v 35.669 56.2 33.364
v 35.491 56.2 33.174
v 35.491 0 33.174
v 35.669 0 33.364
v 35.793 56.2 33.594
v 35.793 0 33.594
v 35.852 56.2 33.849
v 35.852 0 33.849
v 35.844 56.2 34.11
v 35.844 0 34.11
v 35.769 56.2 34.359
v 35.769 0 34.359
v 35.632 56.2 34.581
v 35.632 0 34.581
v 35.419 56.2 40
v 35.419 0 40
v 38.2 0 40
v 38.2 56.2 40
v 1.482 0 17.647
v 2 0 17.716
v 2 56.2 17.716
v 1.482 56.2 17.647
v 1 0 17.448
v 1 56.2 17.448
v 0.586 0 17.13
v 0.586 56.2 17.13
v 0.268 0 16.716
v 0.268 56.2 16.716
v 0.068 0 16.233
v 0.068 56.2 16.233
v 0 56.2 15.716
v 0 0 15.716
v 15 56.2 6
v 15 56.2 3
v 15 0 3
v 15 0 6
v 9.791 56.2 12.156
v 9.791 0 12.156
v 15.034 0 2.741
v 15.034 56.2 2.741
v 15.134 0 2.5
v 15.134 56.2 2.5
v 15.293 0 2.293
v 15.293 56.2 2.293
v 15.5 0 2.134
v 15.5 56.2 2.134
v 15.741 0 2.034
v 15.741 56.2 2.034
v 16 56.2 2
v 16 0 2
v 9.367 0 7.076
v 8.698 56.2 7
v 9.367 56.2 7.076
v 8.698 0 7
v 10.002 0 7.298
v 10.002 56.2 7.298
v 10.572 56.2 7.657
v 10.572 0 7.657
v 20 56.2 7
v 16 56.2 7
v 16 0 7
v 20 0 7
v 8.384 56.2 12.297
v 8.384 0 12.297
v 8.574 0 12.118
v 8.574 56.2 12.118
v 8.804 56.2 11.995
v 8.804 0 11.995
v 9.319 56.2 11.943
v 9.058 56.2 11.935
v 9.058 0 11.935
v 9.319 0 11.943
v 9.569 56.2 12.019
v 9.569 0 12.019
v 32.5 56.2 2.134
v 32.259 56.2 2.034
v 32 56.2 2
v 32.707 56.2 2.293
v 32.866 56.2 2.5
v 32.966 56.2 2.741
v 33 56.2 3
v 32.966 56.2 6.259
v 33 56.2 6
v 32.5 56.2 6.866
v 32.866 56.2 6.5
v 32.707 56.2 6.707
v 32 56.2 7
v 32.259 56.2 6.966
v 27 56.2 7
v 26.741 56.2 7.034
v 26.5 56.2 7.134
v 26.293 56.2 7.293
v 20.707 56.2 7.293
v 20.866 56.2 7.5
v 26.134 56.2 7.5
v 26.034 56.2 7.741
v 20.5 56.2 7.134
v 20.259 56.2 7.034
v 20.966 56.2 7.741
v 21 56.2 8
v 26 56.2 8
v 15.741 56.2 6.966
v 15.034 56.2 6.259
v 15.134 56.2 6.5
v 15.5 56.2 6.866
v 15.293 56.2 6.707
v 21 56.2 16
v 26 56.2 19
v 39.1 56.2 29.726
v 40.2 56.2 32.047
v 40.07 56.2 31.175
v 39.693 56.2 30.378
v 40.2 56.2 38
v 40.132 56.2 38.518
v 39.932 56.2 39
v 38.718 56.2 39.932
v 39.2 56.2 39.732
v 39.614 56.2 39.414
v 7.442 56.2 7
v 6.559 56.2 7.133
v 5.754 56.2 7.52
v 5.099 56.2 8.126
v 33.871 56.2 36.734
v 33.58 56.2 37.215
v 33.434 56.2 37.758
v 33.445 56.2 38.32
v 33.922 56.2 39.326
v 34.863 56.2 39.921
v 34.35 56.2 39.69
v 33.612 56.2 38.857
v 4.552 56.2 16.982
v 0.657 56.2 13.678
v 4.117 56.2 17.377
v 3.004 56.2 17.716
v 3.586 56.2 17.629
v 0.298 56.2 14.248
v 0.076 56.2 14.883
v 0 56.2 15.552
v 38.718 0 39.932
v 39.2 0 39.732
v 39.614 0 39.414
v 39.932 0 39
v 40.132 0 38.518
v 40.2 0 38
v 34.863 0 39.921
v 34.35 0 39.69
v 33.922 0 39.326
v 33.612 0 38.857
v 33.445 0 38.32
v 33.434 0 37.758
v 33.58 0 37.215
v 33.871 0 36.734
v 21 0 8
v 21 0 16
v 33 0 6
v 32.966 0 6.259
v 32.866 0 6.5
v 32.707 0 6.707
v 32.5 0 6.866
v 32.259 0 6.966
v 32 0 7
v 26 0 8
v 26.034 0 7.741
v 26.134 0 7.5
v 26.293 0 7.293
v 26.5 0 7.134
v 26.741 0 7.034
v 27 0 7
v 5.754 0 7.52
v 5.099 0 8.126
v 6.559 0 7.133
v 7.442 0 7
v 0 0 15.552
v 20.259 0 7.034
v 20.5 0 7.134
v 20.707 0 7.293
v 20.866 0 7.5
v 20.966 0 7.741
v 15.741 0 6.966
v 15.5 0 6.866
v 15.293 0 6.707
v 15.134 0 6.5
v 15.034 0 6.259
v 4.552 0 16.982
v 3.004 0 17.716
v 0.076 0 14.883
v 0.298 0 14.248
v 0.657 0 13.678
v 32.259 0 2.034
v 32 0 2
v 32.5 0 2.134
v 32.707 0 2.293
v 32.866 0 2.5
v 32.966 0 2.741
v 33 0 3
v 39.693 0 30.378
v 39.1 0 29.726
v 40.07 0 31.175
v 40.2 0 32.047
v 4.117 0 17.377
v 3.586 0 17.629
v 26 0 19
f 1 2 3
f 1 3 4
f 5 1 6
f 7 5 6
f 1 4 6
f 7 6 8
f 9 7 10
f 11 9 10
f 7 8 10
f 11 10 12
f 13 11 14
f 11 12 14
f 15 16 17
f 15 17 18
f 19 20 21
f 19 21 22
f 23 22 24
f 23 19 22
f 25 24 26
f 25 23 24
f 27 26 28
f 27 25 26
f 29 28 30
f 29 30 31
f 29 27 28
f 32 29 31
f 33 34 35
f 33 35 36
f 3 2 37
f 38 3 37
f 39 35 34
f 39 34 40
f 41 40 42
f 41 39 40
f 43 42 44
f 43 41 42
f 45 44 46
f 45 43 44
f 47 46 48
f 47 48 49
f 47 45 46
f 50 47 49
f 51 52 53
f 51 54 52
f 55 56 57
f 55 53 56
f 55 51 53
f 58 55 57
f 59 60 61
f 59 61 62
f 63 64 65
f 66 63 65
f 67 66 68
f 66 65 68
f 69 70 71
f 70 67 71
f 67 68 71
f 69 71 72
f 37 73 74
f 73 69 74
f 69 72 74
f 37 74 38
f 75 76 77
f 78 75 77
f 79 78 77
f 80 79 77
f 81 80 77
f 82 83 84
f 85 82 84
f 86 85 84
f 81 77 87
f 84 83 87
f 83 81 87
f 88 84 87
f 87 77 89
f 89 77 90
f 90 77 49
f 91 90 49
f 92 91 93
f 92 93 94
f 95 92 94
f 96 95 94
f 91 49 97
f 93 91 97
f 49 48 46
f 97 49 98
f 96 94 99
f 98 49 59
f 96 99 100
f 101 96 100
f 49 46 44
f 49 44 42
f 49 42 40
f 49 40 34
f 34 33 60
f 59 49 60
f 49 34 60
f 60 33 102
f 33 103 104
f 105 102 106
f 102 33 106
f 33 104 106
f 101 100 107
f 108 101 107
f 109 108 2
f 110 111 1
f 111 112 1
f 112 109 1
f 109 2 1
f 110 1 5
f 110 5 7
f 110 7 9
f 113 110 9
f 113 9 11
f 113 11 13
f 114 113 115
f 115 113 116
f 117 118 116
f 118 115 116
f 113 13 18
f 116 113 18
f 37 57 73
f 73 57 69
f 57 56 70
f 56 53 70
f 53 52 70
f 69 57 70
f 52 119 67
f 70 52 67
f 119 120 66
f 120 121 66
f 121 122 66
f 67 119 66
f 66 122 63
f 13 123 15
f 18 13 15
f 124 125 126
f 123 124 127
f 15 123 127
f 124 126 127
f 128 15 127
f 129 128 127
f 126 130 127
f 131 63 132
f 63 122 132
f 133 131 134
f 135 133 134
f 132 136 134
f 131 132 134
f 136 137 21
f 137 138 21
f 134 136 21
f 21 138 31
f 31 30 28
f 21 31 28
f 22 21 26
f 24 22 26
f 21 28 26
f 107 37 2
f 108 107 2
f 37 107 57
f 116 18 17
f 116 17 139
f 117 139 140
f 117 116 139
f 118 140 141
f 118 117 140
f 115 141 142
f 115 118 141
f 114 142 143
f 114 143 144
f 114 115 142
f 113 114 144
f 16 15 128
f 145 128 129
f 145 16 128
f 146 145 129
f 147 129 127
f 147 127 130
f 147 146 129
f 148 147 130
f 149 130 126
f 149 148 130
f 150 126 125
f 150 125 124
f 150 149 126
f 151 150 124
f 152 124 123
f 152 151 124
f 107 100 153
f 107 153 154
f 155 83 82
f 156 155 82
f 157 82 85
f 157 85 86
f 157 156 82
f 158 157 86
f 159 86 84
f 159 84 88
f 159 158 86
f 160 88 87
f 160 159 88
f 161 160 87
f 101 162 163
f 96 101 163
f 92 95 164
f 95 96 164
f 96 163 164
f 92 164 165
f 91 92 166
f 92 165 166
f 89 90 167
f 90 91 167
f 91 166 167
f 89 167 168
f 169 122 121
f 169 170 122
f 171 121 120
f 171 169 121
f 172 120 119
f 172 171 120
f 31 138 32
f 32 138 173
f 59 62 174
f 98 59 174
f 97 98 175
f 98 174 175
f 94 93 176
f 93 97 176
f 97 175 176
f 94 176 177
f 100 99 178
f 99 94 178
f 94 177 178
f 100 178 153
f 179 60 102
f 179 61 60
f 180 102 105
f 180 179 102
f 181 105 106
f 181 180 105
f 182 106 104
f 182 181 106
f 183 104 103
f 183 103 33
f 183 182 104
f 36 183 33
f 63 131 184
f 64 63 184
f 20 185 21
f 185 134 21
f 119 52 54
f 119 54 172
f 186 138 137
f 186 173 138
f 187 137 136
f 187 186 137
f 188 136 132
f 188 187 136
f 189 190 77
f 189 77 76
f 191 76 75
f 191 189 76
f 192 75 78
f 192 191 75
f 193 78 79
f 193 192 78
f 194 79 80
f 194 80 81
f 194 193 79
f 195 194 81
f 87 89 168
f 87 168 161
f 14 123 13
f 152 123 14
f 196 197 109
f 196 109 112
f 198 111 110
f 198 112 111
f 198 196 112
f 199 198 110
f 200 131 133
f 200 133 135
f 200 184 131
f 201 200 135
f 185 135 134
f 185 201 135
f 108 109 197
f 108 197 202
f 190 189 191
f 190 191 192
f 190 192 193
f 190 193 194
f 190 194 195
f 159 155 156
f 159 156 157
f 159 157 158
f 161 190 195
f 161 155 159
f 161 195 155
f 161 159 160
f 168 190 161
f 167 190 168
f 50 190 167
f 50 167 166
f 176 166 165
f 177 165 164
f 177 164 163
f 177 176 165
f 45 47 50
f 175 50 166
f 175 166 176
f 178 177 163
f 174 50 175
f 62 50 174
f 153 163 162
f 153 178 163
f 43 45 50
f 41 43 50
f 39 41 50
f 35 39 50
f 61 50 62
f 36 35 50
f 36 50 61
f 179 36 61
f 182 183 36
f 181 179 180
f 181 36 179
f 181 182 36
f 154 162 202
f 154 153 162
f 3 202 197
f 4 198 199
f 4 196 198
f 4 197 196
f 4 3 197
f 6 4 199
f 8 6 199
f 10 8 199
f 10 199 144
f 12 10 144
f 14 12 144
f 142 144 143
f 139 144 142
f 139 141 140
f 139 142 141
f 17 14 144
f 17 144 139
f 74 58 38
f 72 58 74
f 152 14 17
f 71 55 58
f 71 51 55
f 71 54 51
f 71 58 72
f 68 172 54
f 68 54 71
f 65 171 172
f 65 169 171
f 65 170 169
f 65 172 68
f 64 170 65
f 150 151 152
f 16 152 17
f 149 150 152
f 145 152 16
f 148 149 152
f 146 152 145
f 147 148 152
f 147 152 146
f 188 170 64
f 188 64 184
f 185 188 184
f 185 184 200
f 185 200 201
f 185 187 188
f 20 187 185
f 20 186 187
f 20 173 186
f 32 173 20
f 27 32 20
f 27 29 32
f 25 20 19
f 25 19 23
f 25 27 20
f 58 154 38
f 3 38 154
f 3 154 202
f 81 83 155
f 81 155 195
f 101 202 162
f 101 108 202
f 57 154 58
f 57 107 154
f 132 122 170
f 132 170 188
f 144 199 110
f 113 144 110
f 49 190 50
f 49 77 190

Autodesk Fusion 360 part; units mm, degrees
sketch "Schizzo1" plane through (0, 0, 0) normal (0, 0, 1) x (1, 0, 0)
  line L0 (0, 0) -> (35.2, 0)
  line L1 (35.2, 0) -> (35.2, 56.2)
  line L2 (35.2, 56.2) -> (0, 56.2)
  line L3 (0, 56.2) -> (0, 0)
  dimension "d1" = 35.2
  dimension "d2" = 56.2
extrude "Estrusione1" add sketch "Schizzo1" along normal blind 40
sketch "Schizzo2" plane through (0, 56.2, 0) normal (0, 1, 0) x (-1, 0, 0)
  line L0 (-35.2, 0) -> (0, 0)
  line L1 (0, 0) -> (0, 40)
  line L2 (0, 40) -> (-35.2, 40)
  line L3 (-35.2, 40) -> (-35.2, 0)
  line L4 (-35.2, 40) -> (-31.2, 40)
  line L5 (-31.2, 40) -> (-3.9522, 17.7156)
  line L6 (-3.9522, 17.7156) -> (0, 17.7156)
  dimension "d5" = 4
  dimension "d6" = 35.2
extrude "Estrusione2" cut sketch "Schizzo2" against normal blind 70 contours L1 L2 L5 L6
extrude "Estrusione3" cut 1 faces at (22.1174, 37.4667, 32.5719) along direction (0.63308, 0, -0.774086) blind 5
extrude "Estrusione4" add 1 faces at (35.2, 18.7333, 13.3333) along direction (1, 0, 0) blind 5
fillet "Raccordo1" radius 2 4 edges at (3.9522, 28.1, 17.7156) (0, 28.1, 17.7156) (31.2, 28.1, 40) (40.2, 28.1, 40)
extrude "Estrusione5" cut 1 faces at (25.2828, 37.4667, 28.7014) along direction (0.63308, 0, -0.774086) blind 3
fillet "Raccordo2" radius 1 1 edges at (36.2646, 28.1, 33.8073)
fillet "Raccordo3" radius 1 1 edges at (9.0168, 28.1, 11.5229)
sketch "Schizzo7" plane through (0, 56.2, 0) normal (0, 1, 0) x (-1, 0, 0)
  line L0 (-4.5523, 16.9817) -> (-8.3837, 12.297)
  arc A0 (-9.7909, 12.156) -> (-8.3837, 12.297) centre (-9.1578, 12.9301) ccw
  line L1 (-9.7909, 12.156) -> (-35.4906, 33.1742)
  arc A1 (-35.6316, 34.5814) -> (-35.4906, 33.1742) centre (-34.8575, 33.9483) ccw
  line L2 (-35.6316, 34.5814) -> (-33.8712, 36.7338)
  arc A2 (-33.8712, 36.7338) -> (-35.4194, 40) centre (-35.4194, 38) ccw
  line L3 (-35.4194, 40) -> (-38.2, 40)
  arc A3 (-38.2, 40) -> (-40.2, 38) centre (-38.2, 38) ccw
  line L4 (-40.2, 38) -> (-40.2, 0)
  line L5 (-40.2, 0) -> (0, 0)
  line L6 (0, 0) -> (0, 15.7156)
  arc A4 (0, 15.7156) -> (-2, 17.7156) centre (-2, 15.7156) ccw
  line L7 (-2, 17.7156) -> (-3.0042, 17.7156)
  arc A5 (-3.0042, 17.7156) -> (-4.5523, 16.9817) centre (-3.0042, 15.7156) ccw
  line L8 (-40.2, 30.6261) -> (-26, 19)
  line L9 (-26, 19) -> (-26, 7)
  line L10 (-26, 7) -> (-33, 7)
  line L11 (-33, 7) -> (-33, 2)
  line L12 (-33, 2) -> (-15, 2)
  line L13 (-15, 2) -> (-15, 7)
  line L14 (-15, 7) -> (-21, 7)
  line L15 (-21, 7) -> (-21, 16)
  line L16 (-21, 16) -> (-11, 8)
  line L17 (-11, 8) -> (-9.75, 7)
  line L18 (-9.75, 7) -> (-6, 7)
  line L19 (-6, 7) -> (0, 14.5)
extrude "Estrusione6" cut sketch "Schizzo7" against normal blind 95 contours L4 L5 L6 L8 L9 L10 L11 L12 L13 L14 L15 L16 L17 L18 L19
fillet "Raccordo4" radius 3 4 edges at (0, 28.1, 14.5) (6, 28.1, 7) (9.75, 28.1, 7) (40.2, 28.1, 30.6261)
fillet "Raccordo5" radius 1 6 edges at (26, 28.1, 7) (33, 28.1, 7) (21, 28.1, 7) (15, 28.1, 7) (15, 28.1, 2) (33, 28.1, 2)
sketch "Schizzo3" plane through (0, 56.2, 0) normal (0, 1, 0) x (-1, 0, 0)
  line L0 (-4.5523, 16.9817) -> (-8.3837, 12.297)
  arc A0 (-9.7909, 12.156) -> (-8.3837, 12.297) centre (-9.1578, 12.9301) ccw
  line L1 (-9.7909, 12.156) -> (-35.4906, 33.1742)
  arc A1 (-35.6316, 34.5814) -> (-35.4906, 33.1742) centre (-34.8575, 33.9483) ccw
  line L2 (-35.6316, 34.5814) -> (-33.8712, 36.7338)
  arc A2 (-33.8712, 36.7338) -> (-35.4194, 40) centre (-35.4194, 38) ccw
  line L3 (-35.4194, 40) -> (-38.2, 40)
  arc A3 (-38.2, 40) -> (-40.2, 38) centre (-38.2, 38) ccw
  line L4 (-40.2, 38) -> (-40.2, 0)
  line L5 (-40.2, 0) -> (0, 0)
  line L6 (0, 0) -> (0, 15.7156)
  arc A4 (0, 15.7156) -> (-2, 17.7156) centre (-2, 15.7156) ccw
  line L7 (-2, 17.7156) -> (-3.0042, 17.7156)
  arc A5 (-3.0042, 17.7156) -> (-4.5523, 16.9817) centre (-3.0042, 15.7156) ccw
  line L8 (-40.2, 29.9744) -> (-24.8148, 16.4613)
  line L9 (-24.8148, 16.4613) -> (-24.8148, 5)
  line L10 (-20.1, 5) -> (-20.1, 14)
  line L11 (-20.1, 14) -> (-8.3458, 5)
  line L12 (-8.3458, 5) -> (0, 5)
  line L13 (-32, 5) -> (-32, 0)
  line L14 (-13, 5) -> (-13, 0)
sketch "Schizzo4" plane through (0, 56.2, 0) normal (0, 1, 0) x (-1, 0, 0)
  line L0 (-24.8139, 4.9985) -> (-32, 4.9985)
sketch "Schizzo5" plane through (0, 56.2, 0) normal (0, 1, 0) x (-1, 0, 0)
  line L0 (-13, 5) -> (-20.1, 5)
sketch "Schizzo6" plane through (0, 56.2, 0) normal (0, 1, 0) x (-1, 0, 0)
  line L0 (-13, 0) -> (0, 0)
  line L1 (0, 0) -> (0, 5)
